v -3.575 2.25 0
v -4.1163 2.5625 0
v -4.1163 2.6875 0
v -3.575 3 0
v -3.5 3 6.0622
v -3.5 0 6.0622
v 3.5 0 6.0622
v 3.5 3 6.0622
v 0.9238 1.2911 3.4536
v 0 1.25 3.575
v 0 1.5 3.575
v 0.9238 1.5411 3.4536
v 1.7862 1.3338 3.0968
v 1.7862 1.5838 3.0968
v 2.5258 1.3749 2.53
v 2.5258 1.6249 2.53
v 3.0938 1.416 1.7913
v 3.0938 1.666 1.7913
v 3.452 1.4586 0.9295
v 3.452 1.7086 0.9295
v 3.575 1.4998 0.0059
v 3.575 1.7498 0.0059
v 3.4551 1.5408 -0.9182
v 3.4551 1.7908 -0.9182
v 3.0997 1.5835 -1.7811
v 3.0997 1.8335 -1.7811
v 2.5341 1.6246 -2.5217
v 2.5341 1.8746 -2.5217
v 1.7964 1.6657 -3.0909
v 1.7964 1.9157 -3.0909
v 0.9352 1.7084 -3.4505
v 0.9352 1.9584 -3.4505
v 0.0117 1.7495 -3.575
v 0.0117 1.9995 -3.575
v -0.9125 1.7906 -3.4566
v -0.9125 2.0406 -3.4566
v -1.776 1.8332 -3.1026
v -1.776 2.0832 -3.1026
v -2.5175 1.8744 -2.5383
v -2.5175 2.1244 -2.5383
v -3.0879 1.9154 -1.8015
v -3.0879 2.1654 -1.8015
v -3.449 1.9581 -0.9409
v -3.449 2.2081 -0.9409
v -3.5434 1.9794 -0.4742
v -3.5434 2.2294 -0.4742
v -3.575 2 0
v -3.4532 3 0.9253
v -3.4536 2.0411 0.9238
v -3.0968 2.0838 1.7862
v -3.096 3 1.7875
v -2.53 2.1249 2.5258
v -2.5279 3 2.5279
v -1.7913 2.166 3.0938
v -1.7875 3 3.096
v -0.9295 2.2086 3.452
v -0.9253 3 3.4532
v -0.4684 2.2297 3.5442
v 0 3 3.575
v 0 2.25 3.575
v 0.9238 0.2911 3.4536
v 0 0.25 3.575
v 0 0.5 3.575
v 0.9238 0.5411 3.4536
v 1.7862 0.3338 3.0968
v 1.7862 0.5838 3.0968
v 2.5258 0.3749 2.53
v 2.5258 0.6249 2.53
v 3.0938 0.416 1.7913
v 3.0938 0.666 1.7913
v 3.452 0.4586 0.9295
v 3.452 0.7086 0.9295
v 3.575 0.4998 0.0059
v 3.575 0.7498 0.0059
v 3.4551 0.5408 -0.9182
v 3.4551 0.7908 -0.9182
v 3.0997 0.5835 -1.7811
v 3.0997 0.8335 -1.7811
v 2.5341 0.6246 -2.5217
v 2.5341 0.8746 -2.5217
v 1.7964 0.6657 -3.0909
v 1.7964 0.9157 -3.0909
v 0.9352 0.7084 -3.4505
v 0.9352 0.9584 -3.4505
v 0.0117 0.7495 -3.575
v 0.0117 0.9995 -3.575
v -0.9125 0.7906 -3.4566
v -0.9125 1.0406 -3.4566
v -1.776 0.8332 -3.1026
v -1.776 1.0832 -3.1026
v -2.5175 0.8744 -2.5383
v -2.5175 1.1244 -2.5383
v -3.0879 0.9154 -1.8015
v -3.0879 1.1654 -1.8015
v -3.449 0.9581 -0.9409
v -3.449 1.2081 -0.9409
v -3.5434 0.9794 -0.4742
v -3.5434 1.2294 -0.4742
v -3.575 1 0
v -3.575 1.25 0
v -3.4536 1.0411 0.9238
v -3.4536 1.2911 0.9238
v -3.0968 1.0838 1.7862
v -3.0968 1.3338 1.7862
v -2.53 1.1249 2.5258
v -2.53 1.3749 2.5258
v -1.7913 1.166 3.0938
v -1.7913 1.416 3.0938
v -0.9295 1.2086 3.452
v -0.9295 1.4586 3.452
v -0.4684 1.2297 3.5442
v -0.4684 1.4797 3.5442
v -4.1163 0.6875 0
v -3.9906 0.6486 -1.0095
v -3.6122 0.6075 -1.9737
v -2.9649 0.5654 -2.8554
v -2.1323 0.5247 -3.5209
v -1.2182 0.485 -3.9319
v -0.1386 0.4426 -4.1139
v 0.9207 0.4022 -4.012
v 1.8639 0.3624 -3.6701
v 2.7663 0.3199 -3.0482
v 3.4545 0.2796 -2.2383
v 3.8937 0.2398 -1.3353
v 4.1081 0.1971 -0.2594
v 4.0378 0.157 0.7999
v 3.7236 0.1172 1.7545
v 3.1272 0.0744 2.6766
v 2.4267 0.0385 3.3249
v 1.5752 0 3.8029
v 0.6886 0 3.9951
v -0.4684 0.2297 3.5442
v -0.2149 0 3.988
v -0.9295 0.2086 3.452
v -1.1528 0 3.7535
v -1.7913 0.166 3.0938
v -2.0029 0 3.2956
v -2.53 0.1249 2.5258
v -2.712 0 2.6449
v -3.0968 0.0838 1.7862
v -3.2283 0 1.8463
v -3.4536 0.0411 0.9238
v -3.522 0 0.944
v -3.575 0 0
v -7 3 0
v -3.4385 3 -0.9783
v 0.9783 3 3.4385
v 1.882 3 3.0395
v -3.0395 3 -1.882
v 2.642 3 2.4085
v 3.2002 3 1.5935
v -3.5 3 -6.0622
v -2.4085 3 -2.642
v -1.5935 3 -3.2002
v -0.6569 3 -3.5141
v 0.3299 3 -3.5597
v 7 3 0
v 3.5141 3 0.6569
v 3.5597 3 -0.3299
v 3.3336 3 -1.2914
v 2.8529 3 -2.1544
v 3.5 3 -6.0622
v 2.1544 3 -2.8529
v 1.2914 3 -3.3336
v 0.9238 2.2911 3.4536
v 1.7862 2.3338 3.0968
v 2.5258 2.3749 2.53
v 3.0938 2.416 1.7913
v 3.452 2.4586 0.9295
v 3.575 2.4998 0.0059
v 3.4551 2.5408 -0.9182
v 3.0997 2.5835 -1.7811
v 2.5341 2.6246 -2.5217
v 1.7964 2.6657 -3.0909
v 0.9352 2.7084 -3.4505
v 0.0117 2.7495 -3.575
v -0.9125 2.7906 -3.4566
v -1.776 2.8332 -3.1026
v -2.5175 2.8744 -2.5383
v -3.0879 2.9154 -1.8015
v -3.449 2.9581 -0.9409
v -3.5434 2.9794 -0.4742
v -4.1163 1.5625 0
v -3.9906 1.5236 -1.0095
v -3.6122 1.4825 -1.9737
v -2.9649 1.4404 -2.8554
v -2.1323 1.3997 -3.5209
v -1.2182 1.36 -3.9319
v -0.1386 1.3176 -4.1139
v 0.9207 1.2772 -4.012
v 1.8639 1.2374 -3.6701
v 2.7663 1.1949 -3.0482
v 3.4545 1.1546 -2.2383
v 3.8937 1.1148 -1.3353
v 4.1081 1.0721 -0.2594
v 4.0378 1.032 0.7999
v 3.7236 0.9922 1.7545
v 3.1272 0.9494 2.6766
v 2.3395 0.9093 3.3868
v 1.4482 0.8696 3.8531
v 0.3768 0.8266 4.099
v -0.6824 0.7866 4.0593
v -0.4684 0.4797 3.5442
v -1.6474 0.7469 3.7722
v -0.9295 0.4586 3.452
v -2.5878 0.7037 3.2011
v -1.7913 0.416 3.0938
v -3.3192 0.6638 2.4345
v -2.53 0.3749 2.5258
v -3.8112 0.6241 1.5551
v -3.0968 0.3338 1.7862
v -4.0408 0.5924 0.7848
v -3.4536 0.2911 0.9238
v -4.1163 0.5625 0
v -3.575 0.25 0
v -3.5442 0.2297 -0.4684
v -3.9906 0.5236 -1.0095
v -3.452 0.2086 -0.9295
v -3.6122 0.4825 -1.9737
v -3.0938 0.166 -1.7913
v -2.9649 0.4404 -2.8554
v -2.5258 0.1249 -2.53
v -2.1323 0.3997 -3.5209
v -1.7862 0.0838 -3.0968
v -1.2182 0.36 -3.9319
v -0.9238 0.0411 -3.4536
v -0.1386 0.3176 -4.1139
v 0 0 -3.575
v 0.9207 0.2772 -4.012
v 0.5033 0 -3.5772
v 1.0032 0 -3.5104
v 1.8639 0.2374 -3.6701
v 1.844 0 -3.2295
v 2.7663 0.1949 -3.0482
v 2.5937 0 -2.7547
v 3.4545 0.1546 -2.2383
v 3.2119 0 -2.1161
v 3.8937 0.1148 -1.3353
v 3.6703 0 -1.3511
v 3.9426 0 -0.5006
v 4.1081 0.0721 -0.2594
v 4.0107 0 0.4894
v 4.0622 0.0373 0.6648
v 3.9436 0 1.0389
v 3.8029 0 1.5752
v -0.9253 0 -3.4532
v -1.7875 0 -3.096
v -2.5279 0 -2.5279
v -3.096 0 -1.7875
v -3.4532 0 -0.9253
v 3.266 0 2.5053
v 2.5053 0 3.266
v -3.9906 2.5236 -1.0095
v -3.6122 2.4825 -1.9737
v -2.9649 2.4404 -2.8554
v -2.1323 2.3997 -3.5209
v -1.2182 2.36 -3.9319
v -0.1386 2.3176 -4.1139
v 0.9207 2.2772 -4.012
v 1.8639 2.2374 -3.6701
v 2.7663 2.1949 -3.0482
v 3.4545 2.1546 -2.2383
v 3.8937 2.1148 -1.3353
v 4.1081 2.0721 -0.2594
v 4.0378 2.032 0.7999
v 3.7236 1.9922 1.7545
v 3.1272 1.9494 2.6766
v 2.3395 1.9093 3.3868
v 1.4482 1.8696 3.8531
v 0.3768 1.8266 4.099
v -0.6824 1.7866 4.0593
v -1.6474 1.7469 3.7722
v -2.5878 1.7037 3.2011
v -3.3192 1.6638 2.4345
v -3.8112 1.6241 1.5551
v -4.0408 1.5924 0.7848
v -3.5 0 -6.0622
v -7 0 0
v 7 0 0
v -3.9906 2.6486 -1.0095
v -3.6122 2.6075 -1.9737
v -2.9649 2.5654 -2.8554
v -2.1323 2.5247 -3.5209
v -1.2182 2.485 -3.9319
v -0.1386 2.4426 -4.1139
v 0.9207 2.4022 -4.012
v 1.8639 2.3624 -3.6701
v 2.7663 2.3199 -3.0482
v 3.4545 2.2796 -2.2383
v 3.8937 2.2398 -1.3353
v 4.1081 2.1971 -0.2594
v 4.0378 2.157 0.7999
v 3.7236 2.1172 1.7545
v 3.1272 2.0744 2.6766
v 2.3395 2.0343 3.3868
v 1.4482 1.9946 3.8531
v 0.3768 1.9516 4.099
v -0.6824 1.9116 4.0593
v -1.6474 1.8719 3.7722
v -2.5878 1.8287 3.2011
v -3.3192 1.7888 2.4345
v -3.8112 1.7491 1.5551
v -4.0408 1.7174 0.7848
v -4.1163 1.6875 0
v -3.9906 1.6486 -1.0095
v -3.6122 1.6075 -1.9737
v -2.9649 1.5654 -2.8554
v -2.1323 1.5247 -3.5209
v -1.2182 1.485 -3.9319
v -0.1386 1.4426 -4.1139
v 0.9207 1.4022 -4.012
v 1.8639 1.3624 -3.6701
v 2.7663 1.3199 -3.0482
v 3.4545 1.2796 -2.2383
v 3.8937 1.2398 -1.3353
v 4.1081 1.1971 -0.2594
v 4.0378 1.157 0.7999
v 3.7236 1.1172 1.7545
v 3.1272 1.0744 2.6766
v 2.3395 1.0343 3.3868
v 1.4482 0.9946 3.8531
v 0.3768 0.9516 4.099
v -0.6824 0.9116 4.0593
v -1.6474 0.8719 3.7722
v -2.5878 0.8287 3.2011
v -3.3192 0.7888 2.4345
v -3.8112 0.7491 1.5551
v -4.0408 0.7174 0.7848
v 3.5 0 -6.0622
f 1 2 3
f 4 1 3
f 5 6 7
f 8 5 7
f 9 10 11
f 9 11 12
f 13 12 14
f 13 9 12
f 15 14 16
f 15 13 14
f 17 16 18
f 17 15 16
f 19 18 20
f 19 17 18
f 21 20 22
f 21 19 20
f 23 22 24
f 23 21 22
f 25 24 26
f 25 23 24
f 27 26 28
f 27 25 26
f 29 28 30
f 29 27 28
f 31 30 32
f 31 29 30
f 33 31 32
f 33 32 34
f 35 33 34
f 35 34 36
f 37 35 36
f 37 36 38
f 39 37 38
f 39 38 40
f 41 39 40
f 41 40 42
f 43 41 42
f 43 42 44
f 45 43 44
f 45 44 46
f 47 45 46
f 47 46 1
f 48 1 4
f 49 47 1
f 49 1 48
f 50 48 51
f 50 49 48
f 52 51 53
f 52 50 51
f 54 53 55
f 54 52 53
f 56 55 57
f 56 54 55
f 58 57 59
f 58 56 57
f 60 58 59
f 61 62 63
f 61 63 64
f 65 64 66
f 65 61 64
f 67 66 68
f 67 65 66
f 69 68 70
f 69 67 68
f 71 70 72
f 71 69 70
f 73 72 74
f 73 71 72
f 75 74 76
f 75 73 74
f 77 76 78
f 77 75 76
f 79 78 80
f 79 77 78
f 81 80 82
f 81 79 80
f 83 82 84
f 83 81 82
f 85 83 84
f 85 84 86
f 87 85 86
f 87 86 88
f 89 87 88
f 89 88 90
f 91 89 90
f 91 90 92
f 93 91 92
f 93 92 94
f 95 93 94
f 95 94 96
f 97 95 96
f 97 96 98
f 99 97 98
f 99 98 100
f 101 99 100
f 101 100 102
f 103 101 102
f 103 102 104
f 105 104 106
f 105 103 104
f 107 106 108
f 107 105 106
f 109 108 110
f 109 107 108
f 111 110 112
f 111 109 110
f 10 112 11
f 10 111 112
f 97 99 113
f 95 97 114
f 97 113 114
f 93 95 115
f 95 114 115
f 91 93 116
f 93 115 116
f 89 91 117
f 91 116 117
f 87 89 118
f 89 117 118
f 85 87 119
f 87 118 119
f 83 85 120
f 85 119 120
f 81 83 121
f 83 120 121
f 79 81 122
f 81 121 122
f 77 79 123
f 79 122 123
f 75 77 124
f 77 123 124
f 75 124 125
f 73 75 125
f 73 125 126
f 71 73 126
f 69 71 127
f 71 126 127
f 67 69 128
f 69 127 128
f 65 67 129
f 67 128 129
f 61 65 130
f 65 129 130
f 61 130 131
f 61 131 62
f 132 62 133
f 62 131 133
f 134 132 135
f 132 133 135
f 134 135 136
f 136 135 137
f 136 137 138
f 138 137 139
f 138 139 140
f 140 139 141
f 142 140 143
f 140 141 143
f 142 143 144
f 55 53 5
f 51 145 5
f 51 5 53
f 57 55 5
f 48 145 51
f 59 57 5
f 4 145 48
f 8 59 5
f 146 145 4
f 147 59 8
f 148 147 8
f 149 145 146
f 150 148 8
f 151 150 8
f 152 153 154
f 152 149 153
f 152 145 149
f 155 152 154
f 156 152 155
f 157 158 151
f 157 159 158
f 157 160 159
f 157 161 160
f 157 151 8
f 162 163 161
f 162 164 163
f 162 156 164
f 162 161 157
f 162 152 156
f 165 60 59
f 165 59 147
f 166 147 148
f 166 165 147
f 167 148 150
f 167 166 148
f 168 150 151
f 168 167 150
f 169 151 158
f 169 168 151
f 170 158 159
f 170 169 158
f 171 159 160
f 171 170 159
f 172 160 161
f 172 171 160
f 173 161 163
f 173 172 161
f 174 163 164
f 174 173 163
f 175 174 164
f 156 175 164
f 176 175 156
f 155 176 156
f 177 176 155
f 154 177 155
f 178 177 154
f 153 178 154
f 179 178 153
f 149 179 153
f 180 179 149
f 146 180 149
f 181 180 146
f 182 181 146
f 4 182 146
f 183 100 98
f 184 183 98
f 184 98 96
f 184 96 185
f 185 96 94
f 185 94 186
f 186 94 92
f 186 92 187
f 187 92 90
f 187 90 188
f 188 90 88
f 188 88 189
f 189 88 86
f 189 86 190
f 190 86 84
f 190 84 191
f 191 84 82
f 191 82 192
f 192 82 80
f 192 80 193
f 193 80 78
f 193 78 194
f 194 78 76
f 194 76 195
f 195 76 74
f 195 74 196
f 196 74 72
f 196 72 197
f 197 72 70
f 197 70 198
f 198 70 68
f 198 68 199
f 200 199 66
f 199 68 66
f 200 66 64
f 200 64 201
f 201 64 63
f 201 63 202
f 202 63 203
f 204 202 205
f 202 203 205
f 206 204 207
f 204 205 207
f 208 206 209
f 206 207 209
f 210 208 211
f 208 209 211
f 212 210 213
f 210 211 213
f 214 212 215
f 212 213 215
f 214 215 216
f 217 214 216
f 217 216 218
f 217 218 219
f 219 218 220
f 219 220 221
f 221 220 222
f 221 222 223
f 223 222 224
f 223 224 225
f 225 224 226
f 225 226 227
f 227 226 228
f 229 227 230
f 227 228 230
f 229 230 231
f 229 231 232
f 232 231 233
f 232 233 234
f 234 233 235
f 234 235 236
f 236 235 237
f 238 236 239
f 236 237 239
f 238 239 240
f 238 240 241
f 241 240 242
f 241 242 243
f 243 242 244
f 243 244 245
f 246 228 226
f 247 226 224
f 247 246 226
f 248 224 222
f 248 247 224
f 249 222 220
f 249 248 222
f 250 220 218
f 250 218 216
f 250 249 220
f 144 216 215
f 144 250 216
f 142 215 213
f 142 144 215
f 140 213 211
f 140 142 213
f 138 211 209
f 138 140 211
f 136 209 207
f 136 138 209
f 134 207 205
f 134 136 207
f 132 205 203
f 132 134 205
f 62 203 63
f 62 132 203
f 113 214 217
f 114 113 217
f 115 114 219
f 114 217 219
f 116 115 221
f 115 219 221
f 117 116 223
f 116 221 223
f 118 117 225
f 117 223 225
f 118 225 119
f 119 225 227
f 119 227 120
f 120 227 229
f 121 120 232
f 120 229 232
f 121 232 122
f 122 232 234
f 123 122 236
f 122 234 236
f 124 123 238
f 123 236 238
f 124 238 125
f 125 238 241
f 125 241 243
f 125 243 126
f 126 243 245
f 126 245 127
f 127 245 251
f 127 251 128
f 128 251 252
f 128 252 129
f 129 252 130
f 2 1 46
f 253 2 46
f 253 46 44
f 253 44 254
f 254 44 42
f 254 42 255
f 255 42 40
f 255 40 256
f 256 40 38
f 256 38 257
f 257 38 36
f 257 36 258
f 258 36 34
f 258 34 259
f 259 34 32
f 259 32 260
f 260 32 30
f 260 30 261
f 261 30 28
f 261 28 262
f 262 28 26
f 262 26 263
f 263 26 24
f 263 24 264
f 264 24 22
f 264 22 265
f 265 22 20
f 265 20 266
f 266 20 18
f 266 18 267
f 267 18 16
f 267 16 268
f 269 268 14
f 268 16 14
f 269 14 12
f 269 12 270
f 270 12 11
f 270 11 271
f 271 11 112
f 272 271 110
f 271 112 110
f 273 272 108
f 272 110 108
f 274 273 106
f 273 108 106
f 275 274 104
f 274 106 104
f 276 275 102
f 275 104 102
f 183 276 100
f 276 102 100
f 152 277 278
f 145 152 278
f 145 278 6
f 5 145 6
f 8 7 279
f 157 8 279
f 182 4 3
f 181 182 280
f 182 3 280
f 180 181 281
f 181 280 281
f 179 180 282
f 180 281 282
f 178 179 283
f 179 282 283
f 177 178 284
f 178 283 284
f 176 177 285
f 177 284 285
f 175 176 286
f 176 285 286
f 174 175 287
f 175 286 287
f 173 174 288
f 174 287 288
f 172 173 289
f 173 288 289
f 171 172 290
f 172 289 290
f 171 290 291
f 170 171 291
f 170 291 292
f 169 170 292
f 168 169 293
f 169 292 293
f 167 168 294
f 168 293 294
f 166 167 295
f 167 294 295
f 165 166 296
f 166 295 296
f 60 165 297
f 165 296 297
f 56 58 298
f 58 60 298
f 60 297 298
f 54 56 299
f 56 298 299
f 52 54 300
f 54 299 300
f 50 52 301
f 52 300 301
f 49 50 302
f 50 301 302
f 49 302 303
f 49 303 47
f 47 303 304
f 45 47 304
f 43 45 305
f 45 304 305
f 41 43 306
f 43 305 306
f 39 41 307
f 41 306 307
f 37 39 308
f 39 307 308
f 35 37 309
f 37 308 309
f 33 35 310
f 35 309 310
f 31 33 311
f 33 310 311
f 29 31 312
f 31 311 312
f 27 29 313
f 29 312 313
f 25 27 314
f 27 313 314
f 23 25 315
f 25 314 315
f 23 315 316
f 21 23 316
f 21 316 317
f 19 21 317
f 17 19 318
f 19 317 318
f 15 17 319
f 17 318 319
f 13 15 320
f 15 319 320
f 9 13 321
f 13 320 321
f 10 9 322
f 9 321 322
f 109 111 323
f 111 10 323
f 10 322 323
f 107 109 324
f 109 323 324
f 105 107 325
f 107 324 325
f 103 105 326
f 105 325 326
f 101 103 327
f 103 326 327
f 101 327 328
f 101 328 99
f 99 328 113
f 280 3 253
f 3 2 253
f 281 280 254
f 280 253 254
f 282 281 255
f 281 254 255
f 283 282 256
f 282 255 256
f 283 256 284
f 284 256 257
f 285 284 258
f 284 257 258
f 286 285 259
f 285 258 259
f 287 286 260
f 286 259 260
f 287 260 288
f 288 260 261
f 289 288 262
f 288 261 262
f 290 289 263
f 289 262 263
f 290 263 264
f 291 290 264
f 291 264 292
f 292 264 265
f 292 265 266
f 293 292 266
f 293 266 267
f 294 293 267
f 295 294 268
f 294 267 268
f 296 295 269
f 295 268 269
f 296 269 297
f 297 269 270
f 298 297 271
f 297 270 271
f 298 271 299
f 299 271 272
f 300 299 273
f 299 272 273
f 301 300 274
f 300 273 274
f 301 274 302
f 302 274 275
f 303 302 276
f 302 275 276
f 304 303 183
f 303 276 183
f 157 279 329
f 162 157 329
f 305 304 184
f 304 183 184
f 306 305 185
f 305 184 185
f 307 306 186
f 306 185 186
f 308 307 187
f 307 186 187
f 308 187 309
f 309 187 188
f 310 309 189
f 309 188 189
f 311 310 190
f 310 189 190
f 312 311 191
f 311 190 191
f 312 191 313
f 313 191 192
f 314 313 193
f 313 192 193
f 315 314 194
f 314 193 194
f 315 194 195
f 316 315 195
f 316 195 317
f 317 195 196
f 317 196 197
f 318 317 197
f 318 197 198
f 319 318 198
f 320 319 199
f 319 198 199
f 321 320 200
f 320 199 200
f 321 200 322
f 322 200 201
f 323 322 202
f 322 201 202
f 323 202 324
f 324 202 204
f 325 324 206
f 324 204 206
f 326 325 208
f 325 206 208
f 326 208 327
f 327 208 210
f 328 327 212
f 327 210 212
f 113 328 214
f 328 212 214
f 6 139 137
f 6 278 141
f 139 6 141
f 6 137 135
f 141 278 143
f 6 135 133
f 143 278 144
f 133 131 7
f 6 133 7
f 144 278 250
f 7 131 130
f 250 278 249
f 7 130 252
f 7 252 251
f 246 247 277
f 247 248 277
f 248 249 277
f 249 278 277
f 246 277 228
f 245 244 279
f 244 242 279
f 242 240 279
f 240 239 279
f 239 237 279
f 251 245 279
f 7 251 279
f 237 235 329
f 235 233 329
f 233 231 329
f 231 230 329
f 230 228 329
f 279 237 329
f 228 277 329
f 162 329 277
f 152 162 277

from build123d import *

# Parameters (mm, degrees)
SKETCH1_R           = 3.575
BOSS_EXTRUDE1_DEPTH = 3
THREAD1_PITCH       = 1


with BuildPart() as part:
    # Sketch1 → Boss-Extrude1 (new body)
    with BuildSketch(Plane(origin=(0, 0, 0), x_dir=(1, 0, 0), z_dir=(0, 1, 0))):
        Polygon((7, 0), (3.5, 6.062177826), (-3.5, 6.062177826), (-7, 0), (-3.5, -6.062177826), (3.5, -6.062177826), align=None)
        with Locations(Location((0, 0, 0), (0, 0, 270))):
            Circle(SKETCH1_R, mode=Mode.SUBTRACT)
    extrude(amount=BOSS_EXTRUDE1_DEPTH)

    # Thread1: the profile of Thread Profile1 profile screwed along a right-hand helix of 3 turns, 8 arcs to a turn; built about Z, then put on its axis
    thread1_z = Axis((0, 0, 0), (0, 0, 1))
    thread1_corners = [(3.5747, 0, -0.000173205), (4.116265875, 0, 0.312499999), (4.116265875, 0, 0.437499999), (3.5747, 0, 0.750173202)]
    with BuildLine(mode=Mode.PRIVATE) as thread1_profile:
        Line(thread1_corners[0], thread1_corners[1])
        Line(thread1_corners[1], thread1_corners[2])
        Line(thread1_corners[2], thread1_corners[3])
        Line(thread1_corners[3], thread1_corners[0])
    thread1_cap = Face(thread1_profile.wire())
    thread1_turn_angles = [0, 22.5, 45, 67.5, 90, 112.5, 135, 157.5, 180, 202.5, 225, 247.5, 270, 292.5, 315, 337.5, 360]
    thread1_turn_weights = [1, 0.9238795325112867, 1, 0.9238795325112867, 1, 0.9238795325112867, 1, 0.9238795325112867, 1, 0.9238795325112867, 1, 0.9238795325112867, 1, 0.9238795325112867, 1, 0.9238795325112867, 1]
    thread1_turn_rails = [Edge.make_bspline([Vector(p[0], p[1], 0).rotate(thread1_z, thread1_turn_angles[k]) / thread1_turn_weights[k] + Vector(0, 0, p[2] + THREAD1_PITCH * thread1_turn_angles[k] / 360) for k in range(17)], [0, 0, 0, 1, 1, 2, 2, 3, 3, 4, 4, 5, 5, 6, 6, 7, 7, 8, 8, 8], 2, thread1_turn_weights) for p in thread1_corners]
    thread1_turn_sides = [Face.make_surface_from_curves(thread1_turn_rails[p[0]], thread1_turn_rails[p[1]]) for p in [(0, 1), (1, 2), (2, 3), (3, 0)]]
    thread1 = Plane(origin=(0, 3, 0), x_dir=(-1, 0, 0), z_dir=(0, -1, 0)) * Solid(Shell([*[p.moved(Location((0, 0, THREAD1_PITCH * i))) for i in range(3) for p in thread1_turn_sides], thread1_cap, thread1_cap.rotate(thread1_z, 1080).moved(Location((0, 0, THREAD1_PITCH * 1080 / 360)))]))
    add(thread1, mode=Mode.SUBTRACT)


solid = part.part
